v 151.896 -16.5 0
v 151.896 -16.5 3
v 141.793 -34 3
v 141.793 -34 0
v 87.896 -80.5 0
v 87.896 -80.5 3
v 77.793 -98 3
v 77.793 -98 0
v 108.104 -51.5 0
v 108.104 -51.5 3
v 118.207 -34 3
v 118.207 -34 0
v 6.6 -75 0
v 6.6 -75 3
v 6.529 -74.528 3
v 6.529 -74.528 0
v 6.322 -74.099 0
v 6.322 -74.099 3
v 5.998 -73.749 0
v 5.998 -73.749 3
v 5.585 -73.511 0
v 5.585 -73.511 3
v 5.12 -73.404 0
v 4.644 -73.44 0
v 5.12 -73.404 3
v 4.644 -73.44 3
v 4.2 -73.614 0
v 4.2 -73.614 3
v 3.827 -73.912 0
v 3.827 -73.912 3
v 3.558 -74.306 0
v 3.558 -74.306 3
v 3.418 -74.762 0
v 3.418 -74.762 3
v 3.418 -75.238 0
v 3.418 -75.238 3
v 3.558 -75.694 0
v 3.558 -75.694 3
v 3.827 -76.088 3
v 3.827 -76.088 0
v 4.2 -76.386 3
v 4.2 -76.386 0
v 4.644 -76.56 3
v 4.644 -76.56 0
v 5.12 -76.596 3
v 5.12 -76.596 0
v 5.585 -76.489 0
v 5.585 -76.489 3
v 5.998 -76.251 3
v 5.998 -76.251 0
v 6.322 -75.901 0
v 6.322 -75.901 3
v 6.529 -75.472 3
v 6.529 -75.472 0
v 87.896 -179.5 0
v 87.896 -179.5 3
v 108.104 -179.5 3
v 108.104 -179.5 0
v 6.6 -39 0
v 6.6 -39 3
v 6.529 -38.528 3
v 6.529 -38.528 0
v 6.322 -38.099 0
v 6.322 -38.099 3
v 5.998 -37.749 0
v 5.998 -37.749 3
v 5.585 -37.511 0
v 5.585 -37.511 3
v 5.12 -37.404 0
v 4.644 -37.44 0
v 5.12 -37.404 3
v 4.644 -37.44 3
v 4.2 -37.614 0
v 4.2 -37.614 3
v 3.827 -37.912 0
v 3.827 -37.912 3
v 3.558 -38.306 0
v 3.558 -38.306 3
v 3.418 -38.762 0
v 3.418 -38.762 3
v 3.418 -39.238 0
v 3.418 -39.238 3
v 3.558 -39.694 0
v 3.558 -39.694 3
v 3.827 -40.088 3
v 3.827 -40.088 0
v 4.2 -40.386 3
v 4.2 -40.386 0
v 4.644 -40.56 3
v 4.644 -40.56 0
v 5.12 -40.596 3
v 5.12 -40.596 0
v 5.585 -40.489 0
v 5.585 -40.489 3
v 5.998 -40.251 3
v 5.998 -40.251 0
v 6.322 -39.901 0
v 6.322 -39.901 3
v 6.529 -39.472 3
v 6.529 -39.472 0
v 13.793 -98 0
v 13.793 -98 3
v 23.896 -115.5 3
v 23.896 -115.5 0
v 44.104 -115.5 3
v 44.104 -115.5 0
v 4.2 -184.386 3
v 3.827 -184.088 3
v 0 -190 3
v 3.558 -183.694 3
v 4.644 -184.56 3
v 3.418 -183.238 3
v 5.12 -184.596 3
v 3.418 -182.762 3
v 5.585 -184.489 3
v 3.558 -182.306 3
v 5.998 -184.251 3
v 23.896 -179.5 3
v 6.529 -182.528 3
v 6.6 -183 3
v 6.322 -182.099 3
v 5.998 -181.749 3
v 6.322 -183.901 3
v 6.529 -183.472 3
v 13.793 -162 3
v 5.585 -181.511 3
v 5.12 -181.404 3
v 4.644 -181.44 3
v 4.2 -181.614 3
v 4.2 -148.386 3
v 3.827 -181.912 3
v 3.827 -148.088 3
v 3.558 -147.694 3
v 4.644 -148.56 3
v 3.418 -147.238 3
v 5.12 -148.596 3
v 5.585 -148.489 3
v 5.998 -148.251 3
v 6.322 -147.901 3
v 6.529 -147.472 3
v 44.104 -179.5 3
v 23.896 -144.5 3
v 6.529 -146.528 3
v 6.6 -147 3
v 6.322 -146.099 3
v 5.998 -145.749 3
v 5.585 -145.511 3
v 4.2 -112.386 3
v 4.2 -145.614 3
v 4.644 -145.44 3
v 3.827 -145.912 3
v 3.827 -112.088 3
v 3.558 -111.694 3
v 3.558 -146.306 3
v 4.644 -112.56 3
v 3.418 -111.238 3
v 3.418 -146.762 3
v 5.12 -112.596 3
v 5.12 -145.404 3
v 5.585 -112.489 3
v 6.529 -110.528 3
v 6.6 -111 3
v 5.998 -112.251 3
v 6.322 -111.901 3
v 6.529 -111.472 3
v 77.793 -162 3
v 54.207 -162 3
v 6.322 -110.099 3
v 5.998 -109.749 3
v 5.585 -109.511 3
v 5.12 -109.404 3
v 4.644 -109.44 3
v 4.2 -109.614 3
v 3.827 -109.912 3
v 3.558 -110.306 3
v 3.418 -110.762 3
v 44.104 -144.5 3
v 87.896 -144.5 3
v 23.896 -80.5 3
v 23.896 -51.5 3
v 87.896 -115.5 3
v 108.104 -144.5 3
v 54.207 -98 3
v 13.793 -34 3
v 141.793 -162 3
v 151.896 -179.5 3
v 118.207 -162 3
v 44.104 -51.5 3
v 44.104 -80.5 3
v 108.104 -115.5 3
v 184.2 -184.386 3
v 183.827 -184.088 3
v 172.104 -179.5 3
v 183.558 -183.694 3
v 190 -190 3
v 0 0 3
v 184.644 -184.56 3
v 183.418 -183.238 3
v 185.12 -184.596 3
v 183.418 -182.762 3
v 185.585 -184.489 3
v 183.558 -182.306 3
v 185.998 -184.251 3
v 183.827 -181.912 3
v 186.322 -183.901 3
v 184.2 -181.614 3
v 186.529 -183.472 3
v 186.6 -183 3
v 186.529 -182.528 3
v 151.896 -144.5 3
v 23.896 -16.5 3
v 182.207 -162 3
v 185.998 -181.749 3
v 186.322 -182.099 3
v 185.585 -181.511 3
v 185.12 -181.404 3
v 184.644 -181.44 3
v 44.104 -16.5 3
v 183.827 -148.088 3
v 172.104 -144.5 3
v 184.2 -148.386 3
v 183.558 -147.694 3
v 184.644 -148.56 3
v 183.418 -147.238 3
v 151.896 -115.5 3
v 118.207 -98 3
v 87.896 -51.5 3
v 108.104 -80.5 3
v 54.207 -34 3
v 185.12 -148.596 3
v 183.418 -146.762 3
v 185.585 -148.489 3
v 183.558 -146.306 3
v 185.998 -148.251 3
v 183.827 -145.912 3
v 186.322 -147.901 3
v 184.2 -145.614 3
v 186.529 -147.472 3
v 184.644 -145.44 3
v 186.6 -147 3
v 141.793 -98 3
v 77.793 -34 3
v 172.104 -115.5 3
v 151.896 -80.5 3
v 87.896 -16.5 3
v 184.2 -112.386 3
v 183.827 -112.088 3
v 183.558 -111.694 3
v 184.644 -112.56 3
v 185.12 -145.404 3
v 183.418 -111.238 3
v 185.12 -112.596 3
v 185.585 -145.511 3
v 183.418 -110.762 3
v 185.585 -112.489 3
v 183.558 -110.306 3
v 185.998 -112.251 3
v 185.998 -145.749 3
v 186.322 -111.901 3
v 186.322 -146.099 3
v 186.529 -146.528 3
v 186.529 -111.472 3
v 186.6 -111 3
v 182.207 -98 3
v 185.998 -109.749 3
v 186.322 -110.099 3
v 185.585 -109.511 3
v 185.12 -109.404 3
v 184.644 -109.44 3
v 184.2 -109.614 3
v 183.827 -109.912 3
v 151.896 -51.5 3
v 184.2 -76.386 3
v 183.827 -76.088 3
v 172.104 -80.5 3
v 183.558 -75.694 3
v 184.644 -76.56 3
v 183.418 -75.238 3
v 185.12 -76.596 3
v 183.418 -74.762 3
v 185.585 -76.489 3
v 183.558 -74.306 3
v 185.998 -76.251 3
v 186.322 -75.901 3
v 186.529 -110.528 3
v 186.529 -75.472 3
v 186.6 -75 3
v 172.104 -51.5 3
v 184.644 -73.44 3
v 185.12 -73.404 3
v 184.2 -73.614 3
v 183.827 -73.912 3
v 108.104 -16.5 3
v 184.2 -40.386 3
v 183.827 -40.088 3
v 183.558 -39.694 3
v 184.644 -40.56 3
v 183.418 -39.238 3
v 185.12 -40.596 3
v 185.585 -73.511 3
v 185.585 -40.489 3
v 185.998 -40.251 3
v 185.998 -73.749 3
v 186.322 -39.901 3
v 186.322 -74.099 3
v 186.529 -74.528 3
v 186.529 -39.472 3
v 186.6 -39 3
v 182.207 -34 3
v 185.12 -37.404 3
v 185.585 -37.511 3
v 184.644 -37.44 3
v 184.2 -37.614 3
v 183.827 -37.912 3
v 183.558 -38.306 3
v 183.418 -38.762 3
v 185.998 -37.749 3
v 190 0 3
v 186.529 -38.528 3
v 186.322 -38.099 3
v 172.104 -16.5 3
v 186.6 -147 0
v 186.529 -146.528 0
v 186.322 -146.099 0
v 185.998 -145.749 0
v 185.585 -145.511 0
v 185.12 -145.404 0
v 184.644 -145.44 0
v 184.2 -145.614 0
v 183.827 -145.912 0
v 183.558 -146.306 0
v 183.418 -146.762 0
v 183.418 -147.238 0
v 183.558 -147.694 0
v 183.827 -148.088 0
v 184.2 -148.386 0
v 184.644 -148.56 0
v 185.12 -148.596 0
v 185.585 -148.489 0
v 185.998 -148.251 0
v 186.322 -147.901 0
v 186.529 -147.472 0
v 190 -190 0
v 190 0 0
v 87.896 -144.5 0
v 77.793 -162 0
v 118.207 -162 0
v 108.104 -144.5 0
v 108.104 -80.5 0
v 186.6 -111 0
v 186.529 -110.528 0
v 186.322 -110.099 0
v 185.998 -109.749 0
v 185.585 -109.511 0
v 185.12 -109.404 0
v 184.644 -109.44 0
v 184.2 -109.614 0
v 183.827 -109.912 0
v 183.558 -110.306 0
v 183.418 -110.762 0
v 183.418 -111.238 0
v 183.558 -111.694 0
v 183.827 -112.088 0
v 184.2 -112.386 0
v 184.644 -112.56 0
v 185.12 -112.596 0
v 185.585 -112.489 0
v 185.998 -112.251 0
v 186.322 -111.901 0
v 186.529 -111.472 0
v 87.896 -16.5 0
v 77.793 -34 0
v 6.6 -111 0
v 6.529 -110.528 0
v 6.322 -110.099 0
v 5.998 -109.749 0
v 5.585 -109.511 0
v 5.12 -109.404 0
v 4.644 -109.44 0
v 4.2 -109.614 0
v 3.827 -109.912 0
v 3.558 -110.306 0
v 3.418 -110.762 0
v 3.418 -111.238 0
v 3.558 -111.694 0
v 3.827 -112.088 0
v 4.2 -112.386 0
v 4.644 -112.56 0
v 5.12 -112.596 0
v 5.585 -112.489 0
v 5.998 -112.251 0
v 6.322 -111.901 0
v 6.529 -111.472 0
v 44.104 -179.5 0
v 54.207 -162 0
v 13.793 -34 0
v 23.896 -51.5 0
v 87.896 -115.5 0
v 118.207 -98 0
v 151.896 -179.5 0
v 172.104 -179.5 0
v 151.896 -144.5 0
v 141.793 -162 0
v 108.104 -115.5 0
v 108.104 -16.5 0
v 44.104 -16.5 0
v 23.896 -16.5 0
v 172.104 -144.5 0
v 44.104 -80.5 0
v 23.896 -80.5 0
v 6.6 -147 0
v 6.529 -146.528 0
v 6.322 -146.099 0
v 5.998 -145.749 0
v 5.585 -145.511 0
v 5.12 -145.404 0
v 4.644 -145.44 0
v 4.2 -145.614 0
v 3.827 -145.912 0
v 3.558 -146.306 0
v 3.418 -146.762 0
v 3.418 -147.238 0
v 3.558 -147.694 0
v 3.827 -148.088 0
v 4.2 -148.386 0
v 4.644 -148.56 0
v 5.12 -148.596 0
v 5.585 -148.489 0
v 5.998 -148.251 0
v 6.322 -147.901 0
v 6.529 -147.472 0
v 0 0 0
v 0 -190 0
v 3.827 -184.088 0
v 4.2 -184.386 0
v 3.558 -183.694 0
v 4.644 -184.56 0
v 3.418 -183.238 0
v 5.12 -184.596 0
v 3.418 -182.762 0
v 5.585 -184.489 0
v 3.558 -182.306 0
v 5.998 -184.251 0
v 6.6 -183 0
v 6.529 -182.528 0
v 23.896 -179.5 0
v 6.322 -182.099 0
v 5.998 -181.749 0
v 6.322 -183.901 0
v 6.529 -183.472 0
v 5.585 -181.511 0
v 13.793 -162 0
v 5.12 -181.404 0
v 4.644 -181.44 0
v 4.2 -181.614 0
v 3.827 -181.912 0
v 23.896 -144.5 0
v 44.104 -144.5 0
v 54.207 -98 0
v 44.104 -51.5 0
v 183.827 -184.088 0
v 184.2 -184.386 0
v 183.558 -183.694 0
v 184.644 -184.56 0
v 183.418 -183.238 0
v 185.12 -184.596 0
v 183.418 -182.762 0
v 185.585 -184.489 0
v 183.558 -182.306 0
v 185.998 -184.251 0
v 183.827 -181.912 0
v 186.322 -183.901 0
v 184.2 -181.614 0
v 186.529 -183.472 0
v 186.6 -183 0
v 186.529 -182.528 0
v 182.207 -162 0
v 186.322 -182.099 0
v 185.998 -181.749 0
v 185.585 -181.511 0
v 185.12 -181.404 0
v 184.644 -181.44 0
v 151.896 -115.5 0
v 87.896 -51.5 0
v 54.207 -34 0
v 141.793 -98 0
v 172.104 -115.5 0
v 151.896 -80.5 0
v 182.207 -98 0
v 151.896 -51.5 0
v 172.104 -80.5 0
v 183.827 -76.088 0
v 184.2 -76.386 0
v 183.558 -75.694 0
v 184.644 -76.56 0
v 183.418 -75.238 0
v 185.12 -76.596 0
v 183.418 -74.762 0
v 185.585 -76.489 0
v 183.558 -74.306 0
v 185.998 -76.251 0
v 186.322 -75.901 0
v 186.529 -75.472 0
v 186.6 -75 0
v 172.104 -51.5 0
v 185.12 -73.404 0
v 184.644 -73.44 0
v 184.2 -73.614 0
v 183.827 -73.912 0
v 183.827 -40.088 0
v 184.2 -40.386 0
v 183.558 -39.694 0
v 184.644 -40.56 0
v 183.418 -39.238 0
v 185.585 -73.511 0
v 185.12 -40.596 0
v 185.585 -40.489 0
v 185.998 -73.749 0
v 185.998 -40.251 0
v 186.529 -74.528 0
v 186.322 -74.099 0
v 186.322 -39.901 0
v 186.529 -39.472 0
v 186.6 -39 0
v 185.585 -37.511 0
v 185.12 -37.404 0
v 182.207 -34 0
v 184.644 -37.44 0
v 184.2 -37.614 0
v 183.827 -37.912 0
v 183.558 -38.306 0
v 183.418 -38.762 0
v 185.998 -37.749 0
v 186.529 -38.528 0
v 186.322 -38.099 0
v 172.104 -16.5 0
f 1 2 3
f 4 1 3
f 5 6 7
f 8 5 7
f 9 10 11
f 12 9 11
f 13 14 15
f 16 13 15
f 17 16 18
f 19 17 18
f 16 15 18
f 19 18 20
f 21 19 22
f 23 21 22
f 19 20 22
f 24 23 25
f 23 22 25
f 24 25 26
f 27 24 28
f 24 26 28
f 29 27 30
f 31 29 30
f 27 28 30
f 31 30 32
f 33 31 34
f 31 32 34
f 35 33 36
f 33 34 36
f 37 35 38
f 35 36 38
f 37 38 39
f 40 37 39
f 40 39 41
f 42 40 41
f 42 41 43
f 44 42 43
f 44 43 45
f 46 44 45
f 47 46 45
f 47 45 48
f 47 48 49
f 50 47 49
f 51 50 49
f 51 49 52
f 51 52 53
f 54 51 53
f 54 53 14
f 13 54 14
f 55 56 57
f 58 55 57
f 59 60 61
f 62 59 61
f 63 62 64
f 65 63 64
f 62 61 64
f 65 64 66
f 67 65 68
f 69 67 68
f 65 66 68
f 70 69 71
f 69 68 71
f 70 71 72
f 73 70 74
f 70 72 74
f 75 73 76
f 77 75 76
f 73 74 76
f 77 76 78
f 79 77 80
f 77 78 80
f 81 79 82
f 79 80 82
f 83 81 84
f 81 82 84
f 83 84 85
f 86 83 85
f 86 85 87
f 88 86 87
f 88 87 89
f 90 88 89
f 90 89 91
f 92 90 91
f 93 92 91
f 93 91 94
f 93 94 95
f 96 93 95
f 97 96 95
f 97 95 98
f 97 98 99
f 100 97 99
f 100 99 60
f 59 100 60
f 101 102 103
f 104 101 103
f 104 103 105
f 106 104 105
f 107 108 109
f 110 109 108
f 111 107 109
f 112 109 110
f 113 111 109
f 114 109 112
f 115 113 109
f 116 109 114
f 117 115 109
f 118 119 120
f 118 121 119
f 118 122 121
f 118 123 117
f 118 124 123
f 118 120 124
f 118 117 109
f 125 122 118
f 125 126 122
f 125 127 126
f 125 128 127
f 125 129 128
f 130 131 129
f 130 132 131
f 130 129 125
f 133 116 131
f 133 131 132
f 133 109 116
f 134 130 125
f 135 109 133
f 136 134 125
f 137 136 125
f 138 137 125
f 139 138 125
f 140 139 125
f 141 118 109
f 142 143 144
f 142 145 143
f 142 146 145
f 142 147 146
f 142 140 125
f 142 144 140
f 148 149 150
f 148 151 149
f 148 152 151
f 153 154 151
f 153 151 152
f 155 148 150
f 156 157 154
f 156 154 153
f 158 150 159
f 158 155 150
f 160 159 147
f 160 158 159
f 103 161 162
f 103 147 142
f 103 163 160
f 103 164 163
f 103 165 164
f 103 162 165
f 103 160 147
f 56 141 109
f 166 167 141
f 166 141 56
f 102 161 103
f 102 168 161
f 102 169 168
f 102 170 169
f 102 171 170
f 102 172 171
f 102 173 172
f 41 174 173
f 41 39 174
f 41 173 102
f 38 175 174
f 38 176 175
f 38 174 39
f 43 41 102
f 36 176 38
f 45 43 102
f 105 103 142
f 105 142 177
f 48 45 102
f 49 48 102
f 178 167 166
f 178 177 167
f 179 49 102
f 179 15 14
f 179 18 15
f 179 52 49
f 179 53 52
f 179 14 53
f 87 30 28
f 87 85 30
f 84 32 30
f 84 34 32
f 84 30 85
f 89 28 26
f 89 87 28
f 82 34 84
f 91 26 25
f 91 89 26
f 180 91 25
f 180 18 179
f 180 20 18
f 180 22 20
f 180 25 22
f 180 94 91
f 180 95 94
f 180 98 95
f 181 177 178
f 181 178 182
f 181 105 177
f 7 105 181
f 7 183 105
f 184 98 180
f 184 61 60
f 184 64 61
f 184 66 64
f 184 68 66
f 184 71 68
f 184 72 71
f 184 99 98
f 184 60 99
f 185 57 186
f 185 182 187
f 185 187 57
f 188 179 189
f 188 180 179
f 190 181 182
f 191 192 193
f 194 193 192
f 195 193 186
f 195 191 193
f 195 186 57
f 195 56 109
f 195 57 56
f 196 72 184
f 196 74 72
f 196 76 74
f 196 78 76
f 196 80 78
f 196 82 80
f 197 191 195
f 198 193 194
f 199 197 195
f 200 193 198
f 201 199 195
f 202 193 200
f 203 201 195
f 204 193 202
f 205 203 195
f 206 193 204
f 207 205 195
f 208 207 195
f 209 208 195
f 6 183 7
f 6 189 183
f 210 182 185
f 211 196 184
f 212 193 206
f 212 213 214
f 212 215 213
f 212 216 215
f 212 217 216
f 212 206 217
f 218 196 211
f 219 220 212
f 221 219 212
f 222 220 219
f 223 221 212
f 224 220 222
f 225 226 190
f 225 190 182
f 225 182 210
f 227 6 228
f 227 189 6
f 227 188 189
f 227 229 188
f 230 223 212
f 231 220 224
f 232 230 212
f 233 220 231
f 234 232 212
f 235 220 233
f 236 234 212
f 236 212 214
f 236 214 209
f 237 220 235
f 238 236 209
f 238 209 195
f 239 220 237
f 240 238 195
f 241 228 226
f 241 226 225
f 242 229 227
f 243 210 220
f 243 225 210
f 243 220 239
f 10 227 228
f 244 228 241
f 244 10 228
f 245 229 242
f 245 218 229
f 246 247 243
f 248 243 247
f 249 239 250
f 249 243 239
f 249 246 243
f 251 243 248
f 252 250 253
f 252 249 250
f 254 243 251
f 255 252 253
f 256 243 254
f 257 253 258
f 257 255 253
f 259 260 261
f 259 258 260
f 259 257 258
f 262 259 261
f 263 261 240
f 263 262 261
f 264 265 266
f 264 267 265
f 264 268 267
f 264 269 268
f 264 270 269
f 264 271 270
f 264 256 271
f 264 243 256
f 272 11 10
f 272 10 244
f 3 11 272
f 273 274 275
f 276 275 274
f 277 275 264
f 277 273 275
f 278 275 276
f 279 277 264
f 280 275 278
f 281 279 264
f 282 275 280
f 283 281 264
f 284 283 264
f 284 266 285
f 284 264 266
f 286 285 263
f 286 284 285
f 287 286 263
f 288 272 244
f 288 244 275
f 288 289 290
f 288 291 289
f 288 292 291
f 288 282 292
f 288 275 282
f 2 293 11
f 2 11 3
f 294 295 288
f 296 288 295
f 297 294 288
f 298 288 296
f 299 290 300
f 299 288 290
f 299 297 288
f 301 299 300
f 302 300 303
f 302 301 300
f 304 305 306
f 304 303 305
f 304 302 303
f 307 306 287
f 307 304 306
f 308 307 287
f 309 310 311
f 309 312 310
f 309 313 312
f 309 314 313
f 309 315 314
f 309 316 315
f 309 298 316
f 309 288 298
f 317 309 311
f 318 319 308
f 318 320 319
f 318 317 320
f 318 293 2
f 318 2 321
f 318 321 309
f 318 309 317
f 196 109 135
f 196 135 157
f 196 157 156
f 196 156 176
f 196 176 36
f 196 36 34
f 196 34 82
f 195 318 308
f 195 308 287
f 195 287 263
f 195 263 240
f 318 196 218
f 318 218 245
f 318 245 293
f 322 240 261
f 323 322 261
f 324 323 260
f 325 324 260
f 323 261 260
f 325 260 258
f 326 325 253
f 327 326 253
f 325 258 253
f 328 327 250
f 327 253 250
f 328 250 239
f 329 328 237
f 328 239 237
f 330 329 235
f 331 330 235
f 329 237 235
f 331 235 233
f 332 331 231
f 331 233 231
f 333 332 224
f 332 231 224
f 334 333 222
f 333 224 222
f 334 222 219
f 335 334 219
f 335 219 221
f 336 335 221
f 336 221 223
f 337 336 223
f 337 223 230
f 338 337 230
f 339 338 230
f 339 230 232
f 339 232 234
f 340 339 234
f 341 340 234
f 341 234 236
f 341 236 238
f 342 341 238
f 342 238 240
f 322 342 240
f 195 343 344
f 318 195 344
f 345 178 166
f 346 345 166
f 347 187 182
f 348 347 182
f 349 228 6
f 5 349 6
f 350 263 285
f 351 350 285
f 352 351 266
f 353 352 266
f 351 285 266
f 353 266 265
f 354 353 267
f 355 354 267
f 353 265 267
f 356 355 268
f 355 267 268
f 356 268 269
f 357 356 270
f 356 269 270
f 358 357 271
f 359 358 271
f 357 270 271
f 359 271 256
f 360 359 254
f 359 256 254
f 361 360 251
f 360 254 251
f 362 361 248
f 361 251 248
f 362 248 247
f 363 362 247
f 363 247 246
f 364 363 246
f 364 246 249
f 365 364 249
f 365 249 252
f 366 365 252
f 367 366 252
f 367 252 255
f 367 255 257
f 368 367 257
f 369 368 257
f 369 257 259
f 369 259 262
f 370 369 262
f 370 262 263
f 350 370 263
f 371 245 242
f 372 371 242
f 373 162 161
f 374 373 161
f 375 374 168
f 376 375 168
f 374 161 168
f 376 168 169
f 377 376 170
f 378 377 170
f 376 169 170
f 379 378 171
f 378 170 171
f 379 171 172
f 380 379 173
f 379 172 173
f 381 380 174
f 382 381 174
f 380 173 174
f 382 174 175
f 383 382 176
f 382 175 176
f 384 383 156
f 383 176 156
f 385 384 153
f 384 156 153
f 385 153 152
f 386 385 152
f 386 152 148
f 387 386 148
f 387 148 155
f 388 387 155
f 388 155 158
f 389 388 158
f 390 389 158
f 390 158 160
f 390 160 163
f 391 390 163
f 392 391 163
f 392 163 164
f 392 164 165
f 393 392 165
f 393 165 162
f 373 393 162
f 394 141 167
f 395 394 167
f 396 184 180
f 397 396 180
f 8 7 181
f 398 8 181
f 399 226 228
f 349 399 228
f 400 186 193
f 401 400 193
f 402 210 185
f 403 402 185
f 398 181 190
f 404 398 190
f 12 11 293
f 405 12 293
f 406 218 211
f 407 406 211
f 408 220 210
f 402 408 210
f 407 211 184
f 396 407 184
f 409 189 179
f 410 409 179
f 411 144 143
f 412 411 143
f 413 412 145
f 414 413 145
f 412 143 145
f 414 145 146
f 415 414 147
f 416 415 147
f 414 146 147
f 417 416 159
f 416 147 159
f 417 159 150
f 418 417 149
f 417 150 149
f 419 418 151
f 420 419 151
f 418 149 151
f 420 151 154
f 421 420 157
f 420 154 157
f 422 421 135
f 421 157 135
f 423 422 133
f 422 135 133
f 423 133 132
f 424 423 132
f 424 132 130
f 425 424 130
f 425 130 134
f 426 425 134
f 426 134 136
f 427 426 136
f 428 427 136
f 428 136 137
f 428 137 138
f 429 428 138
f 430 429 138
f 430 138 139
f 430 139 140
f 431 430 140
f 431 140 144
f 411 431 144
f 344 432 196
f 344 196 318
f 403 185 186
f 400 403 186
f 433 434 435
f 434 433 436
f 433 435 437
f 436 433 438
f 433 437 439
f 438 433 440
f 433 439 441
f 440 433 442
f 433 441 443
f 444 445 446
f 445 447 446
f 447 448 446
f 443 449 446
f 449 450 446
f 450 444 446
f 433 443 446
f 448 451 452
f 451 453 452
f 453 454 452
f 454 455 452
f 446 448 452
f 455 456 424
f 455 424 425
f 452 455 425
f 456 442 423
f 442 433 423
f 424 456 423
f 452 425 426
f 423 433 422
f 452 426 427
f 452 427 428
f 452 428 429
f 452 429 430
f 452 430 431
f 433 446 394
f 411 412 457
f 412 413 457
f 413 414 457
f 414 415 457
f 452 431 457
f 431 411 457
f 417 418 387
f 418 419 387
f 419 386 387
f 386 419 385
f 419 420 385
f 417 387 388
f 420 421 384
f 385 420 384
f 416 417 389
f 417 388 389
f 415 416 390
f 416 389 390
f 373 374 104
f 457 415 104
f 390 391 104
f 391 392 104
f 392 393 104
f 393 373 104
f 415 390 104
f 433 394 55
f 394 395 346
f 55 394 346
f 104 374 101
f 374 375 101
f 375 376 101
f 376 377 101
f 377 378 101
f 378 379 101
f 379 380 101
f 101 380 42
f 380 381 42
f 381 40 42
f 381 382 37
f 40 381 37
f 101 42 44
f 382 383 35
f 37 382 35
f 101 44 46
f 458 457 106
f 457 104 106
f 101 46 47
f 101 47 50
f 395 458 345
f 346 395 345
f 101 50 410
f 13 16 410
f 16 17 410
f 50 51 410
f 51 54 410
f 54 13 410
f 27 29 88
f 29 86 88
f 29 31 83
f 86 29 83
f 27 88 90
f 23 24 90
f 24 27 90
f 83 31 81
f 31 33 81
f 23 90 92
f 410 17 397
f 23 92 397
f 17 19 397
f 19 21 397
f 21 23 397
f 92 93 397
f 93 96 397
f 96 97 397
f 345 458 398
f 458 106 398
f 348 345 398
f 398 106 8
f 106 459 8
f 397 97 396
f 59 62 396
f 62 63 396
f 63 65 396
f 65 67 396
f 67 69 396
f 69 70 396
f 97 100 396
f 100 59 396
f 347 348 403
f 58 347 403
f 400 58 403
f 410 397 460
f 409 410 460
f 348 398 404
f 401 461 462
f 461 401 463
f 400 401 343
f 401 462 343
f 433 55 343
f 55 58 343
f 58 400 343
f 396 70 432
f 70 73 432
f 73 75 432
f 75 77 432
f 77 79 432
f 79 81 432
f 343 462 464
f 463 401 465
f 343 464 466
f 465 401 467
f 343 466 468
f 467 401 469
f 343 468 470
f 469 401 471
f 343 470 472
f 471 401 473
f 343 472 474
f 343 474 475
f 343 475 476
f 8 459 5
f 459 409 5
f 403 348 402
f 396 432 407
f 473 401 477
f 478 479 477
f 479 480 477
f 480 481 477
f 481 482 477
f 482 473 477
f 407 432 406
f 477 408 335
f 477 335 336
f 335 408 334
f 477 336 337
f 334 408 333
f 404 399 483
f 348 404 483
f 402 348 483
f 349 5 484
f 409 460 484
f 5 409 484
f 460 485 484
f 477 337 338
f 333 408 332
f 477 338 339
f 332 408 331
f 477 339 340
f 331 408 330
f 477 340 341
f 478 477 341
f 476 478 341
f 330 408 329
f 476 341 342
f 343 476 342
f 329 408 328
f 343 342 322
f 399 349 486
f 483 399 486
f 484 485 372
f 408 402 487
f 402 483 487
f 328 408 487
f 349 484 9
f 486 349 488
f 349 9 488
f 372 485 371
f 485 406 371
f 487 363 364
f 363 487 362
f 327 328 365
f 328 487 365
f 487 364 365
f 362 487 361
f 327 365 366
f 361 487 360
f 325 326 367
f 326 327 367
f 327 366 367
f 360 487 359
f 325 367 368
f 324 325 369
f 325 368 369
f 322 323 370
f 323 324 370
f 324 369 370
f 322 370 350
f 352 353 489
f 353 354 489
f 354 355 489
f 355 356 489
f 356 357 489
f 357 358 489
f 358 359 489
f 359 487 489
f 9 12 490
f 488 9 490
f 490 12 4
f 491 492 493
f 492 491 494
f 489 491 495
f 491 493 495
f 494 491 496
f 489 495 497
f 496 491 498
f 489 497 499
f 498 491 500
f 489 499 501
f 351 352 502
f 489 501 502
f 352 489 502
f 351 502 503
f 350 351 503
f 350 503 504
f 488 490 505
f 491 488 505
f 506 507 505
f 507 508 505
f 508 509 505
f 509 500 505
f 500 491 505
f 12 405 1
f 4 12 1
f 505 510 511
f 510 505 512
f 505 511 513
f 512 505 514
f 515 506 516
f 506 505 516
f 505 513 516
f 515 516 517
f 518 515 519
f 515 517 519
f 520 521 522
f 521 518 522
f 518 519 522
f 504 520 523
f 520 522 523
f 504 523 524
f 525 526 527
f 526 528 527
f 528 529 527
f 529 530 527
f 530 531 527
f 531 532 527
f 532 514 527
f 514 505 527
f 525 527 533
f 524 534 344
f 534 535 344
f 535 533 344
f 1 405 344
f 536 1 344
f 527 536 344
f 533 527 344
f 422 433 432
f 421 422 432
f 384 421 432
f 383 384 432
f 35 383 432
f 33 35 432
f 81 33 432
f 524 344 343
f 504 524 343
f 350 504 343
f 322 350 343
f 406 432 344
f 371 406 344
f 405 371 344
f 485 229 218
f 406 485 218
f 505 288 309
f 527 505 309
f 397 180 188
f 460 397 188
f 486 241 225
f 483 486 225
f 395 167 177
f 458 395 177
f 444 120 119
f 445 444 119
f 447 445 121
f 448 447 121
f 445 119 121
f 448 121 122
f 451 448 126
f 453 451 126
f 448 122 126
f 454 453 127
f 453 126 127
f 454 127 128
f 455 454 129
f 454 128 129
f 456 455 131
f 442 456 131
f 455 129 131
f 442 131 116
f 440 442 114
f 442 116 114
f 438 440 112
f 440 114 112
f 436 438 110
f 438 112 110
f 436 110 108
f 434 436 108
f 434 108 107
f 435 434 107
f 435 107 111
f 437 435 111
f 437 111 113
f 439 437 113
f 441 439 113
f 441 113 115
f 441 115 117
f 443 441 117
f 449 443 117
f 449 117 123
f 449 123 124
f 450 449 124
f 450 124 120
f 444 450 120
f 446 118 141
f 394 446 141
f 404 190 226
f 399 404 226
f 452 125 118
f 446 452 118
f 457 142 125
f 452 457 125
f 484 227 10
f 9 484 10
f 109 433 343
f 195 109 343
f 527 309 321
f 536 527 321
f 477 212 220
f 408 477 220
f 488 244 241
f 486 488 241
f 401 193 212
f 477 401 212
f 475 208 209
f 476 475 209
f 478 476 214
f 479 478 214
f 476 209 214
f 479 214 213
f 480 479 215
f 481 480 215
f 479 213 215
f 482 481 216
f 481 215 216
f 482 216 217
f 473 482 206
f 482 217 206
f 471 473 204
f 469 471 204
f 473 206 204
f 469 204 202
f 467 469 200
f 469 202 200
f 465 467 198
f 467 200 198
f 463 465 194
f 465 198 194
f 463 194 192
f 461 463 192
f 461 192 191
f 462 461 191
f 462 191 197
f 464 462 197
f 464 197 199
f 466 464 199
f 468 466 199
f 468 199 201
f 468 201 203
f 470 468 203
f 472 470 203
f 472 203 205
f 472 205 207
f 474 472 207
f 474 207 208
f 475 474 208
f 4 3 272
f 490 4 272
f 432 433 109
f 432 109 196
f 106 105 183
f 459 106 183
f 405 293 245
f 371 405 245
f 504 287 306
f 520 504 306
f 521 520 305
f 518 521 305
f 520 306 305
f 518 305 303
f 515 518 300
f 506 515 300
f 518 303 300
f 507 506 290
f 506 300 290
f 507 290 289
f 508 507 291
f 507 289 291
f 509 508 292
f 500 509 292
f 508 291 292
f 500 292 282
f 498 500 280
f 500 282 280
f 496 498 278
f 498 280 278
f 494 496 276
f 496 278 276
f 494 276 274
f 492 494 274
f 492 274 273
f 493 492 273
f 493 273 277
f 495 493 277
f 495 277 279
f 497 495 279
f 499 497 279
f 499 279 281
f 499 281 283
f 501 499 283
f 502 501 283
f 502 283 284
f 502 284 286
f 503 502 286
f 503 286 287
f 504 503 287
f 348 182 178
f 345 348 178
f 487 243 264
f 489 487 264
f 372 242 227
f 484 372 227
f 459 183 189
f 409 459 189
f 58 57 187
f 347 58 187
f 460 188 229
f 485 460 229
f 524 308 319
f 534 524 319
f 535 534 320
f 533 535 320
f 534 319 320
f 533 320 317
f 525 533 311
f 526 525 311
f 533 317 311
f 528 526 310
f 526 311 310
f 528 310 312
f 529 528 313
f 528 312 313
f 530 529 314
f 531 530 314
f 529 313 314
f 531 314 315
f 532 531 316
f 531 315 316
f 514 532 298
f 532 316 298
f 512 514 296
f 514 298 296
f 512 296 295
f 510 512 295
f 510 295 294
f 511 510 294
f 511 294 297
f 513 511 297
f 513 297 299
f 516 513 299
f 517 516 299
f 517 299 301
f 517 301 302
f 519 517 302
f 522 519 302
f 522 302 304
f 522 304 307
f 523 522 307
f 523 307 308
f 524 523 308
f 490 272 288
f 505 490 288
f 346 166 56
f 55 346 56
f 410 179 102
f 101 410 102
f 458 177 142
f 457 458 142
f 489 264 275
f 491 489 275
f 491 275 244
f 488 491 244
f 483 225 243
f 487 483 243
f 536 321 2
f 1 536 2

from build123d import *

# Parameters (mm, degrees)
SKETCH_1_W          = 190
SKETCH_1_H          = 190
EXTRUDE_1_DEPTH     = 3
CUT_EXTRUDE_1_DEPTH = 3
SKETCH_3_R          = 1.6
CUT_EXTRUDE_2_DEPTH = 10


with BuildPart() as part:
    # 草图1 → 凸台-拉伸1 (new body)
    with BuildSketch(Plane.XY):
        with Locations((95, -95)):
            Rectangle(SKETCH_1_W, SKETCH_1_H)
    extrude(amount=EXTRUDE_1_DEPTH)

    # 草图2 → 切除-拉伸1 (cut)
    with BuildSketch(Plane.XY.offset(3)):
        Polygon((54.207259422, -34), (44.103629711, -16.5), (23.896370289, -16.5), (13.792740578, -34), (23.896370289, -51.5), (44.103629711, -51.5), align=None)
        Polygon((108.103629711, -16.5), (87.896370289, -16.5), (77.792740578, -34), (87.896370289, -51.5), (108.103629711, -51.5), (118.207259422, -34), align=None)
        Polygon((172.103629711, -16.5), (151.896370289, -16.5), (141.792740578, -34), (151.896370289, -51.5), (172.103629711, -51.5), (182.207259422, -34), align=None)
        Polygon((108.103629711, -80.5), (87.896370289, -80.5), (77.792740578, -98), (87.896370289, -115.5), (108.103629711, -115.5), (118.207259422, -98), align=None)
        Polygon((172.103629711, -80.5), (151.896370289, -80.5), (141.792740578, -98), (151.896370289, -115.5), (172.103629711, -115.5), (182.207259422, -98), align=None)
        Polygon((108.103629711, -144.5), (87.896370289, -144.5), (77.792740578, -162), (87.896370289, -179.5), (108.103629711, -179.5), (118.207259422, -162), align=None)
        Polygon((172.103629711, -144.5), (151.896370289, -144.5), (141.792740578, -162), (151.896370289, -179.5), (172.103629711, -179.5), (182.207259422, -162), align=None)
        Polygon((44.103629711, -80.5), (23.896370289, -80.5), (13.792740578, -98), (23.896370289, -115.5), (44.103629711, -115.5), (54.207259422, -98), align=None)
        Polygon((44.103629711, -144.5), (23.896370289, -144.5), (13.792740578, -162), (23.896370289, -179.5), (44.103629711, -179.5), (54.207259422, -162), align=None)
    extrude(amount=-CUT_EXTRUDE_1_DEPTH, mode=Mode.SUBTRACT)

    # 草图3 → 切除-拉伸2 (cut)
    with BuildSketch(Plane.XY.offset(3)):
        with Locations((5, -75)):
            Circle(SKETCH_3_R)
        with Locations((185, -75)):
            Circle(SKETCH_3_R)
        with Locations((5, -111)):
            Circle(SKETCH_3_R)
        with Locations((185, -111)):
            Circle(SKETCH_3_R)
        with Locations((5, -147)):
            Circle(SKETCH_3_R)
        with Locations((185, -147)):
            Circle(SKETCH_3_R)
        with Locations((5, -183)):
            Circle(SKETCH_3_R)
        with Locations((185, -183)):
            Circle(SKETCH_3_R)
        with Locations((5, -39)):
            Circle(SKETCH_3_R)
        with Locations((185, -39)):
            Circle(SKETCH_3_R)
    extrude(amount=-CUT_EXTRUDE_2_DEPTH, mode=Mode.SUBTRACT)


solid = part.part
